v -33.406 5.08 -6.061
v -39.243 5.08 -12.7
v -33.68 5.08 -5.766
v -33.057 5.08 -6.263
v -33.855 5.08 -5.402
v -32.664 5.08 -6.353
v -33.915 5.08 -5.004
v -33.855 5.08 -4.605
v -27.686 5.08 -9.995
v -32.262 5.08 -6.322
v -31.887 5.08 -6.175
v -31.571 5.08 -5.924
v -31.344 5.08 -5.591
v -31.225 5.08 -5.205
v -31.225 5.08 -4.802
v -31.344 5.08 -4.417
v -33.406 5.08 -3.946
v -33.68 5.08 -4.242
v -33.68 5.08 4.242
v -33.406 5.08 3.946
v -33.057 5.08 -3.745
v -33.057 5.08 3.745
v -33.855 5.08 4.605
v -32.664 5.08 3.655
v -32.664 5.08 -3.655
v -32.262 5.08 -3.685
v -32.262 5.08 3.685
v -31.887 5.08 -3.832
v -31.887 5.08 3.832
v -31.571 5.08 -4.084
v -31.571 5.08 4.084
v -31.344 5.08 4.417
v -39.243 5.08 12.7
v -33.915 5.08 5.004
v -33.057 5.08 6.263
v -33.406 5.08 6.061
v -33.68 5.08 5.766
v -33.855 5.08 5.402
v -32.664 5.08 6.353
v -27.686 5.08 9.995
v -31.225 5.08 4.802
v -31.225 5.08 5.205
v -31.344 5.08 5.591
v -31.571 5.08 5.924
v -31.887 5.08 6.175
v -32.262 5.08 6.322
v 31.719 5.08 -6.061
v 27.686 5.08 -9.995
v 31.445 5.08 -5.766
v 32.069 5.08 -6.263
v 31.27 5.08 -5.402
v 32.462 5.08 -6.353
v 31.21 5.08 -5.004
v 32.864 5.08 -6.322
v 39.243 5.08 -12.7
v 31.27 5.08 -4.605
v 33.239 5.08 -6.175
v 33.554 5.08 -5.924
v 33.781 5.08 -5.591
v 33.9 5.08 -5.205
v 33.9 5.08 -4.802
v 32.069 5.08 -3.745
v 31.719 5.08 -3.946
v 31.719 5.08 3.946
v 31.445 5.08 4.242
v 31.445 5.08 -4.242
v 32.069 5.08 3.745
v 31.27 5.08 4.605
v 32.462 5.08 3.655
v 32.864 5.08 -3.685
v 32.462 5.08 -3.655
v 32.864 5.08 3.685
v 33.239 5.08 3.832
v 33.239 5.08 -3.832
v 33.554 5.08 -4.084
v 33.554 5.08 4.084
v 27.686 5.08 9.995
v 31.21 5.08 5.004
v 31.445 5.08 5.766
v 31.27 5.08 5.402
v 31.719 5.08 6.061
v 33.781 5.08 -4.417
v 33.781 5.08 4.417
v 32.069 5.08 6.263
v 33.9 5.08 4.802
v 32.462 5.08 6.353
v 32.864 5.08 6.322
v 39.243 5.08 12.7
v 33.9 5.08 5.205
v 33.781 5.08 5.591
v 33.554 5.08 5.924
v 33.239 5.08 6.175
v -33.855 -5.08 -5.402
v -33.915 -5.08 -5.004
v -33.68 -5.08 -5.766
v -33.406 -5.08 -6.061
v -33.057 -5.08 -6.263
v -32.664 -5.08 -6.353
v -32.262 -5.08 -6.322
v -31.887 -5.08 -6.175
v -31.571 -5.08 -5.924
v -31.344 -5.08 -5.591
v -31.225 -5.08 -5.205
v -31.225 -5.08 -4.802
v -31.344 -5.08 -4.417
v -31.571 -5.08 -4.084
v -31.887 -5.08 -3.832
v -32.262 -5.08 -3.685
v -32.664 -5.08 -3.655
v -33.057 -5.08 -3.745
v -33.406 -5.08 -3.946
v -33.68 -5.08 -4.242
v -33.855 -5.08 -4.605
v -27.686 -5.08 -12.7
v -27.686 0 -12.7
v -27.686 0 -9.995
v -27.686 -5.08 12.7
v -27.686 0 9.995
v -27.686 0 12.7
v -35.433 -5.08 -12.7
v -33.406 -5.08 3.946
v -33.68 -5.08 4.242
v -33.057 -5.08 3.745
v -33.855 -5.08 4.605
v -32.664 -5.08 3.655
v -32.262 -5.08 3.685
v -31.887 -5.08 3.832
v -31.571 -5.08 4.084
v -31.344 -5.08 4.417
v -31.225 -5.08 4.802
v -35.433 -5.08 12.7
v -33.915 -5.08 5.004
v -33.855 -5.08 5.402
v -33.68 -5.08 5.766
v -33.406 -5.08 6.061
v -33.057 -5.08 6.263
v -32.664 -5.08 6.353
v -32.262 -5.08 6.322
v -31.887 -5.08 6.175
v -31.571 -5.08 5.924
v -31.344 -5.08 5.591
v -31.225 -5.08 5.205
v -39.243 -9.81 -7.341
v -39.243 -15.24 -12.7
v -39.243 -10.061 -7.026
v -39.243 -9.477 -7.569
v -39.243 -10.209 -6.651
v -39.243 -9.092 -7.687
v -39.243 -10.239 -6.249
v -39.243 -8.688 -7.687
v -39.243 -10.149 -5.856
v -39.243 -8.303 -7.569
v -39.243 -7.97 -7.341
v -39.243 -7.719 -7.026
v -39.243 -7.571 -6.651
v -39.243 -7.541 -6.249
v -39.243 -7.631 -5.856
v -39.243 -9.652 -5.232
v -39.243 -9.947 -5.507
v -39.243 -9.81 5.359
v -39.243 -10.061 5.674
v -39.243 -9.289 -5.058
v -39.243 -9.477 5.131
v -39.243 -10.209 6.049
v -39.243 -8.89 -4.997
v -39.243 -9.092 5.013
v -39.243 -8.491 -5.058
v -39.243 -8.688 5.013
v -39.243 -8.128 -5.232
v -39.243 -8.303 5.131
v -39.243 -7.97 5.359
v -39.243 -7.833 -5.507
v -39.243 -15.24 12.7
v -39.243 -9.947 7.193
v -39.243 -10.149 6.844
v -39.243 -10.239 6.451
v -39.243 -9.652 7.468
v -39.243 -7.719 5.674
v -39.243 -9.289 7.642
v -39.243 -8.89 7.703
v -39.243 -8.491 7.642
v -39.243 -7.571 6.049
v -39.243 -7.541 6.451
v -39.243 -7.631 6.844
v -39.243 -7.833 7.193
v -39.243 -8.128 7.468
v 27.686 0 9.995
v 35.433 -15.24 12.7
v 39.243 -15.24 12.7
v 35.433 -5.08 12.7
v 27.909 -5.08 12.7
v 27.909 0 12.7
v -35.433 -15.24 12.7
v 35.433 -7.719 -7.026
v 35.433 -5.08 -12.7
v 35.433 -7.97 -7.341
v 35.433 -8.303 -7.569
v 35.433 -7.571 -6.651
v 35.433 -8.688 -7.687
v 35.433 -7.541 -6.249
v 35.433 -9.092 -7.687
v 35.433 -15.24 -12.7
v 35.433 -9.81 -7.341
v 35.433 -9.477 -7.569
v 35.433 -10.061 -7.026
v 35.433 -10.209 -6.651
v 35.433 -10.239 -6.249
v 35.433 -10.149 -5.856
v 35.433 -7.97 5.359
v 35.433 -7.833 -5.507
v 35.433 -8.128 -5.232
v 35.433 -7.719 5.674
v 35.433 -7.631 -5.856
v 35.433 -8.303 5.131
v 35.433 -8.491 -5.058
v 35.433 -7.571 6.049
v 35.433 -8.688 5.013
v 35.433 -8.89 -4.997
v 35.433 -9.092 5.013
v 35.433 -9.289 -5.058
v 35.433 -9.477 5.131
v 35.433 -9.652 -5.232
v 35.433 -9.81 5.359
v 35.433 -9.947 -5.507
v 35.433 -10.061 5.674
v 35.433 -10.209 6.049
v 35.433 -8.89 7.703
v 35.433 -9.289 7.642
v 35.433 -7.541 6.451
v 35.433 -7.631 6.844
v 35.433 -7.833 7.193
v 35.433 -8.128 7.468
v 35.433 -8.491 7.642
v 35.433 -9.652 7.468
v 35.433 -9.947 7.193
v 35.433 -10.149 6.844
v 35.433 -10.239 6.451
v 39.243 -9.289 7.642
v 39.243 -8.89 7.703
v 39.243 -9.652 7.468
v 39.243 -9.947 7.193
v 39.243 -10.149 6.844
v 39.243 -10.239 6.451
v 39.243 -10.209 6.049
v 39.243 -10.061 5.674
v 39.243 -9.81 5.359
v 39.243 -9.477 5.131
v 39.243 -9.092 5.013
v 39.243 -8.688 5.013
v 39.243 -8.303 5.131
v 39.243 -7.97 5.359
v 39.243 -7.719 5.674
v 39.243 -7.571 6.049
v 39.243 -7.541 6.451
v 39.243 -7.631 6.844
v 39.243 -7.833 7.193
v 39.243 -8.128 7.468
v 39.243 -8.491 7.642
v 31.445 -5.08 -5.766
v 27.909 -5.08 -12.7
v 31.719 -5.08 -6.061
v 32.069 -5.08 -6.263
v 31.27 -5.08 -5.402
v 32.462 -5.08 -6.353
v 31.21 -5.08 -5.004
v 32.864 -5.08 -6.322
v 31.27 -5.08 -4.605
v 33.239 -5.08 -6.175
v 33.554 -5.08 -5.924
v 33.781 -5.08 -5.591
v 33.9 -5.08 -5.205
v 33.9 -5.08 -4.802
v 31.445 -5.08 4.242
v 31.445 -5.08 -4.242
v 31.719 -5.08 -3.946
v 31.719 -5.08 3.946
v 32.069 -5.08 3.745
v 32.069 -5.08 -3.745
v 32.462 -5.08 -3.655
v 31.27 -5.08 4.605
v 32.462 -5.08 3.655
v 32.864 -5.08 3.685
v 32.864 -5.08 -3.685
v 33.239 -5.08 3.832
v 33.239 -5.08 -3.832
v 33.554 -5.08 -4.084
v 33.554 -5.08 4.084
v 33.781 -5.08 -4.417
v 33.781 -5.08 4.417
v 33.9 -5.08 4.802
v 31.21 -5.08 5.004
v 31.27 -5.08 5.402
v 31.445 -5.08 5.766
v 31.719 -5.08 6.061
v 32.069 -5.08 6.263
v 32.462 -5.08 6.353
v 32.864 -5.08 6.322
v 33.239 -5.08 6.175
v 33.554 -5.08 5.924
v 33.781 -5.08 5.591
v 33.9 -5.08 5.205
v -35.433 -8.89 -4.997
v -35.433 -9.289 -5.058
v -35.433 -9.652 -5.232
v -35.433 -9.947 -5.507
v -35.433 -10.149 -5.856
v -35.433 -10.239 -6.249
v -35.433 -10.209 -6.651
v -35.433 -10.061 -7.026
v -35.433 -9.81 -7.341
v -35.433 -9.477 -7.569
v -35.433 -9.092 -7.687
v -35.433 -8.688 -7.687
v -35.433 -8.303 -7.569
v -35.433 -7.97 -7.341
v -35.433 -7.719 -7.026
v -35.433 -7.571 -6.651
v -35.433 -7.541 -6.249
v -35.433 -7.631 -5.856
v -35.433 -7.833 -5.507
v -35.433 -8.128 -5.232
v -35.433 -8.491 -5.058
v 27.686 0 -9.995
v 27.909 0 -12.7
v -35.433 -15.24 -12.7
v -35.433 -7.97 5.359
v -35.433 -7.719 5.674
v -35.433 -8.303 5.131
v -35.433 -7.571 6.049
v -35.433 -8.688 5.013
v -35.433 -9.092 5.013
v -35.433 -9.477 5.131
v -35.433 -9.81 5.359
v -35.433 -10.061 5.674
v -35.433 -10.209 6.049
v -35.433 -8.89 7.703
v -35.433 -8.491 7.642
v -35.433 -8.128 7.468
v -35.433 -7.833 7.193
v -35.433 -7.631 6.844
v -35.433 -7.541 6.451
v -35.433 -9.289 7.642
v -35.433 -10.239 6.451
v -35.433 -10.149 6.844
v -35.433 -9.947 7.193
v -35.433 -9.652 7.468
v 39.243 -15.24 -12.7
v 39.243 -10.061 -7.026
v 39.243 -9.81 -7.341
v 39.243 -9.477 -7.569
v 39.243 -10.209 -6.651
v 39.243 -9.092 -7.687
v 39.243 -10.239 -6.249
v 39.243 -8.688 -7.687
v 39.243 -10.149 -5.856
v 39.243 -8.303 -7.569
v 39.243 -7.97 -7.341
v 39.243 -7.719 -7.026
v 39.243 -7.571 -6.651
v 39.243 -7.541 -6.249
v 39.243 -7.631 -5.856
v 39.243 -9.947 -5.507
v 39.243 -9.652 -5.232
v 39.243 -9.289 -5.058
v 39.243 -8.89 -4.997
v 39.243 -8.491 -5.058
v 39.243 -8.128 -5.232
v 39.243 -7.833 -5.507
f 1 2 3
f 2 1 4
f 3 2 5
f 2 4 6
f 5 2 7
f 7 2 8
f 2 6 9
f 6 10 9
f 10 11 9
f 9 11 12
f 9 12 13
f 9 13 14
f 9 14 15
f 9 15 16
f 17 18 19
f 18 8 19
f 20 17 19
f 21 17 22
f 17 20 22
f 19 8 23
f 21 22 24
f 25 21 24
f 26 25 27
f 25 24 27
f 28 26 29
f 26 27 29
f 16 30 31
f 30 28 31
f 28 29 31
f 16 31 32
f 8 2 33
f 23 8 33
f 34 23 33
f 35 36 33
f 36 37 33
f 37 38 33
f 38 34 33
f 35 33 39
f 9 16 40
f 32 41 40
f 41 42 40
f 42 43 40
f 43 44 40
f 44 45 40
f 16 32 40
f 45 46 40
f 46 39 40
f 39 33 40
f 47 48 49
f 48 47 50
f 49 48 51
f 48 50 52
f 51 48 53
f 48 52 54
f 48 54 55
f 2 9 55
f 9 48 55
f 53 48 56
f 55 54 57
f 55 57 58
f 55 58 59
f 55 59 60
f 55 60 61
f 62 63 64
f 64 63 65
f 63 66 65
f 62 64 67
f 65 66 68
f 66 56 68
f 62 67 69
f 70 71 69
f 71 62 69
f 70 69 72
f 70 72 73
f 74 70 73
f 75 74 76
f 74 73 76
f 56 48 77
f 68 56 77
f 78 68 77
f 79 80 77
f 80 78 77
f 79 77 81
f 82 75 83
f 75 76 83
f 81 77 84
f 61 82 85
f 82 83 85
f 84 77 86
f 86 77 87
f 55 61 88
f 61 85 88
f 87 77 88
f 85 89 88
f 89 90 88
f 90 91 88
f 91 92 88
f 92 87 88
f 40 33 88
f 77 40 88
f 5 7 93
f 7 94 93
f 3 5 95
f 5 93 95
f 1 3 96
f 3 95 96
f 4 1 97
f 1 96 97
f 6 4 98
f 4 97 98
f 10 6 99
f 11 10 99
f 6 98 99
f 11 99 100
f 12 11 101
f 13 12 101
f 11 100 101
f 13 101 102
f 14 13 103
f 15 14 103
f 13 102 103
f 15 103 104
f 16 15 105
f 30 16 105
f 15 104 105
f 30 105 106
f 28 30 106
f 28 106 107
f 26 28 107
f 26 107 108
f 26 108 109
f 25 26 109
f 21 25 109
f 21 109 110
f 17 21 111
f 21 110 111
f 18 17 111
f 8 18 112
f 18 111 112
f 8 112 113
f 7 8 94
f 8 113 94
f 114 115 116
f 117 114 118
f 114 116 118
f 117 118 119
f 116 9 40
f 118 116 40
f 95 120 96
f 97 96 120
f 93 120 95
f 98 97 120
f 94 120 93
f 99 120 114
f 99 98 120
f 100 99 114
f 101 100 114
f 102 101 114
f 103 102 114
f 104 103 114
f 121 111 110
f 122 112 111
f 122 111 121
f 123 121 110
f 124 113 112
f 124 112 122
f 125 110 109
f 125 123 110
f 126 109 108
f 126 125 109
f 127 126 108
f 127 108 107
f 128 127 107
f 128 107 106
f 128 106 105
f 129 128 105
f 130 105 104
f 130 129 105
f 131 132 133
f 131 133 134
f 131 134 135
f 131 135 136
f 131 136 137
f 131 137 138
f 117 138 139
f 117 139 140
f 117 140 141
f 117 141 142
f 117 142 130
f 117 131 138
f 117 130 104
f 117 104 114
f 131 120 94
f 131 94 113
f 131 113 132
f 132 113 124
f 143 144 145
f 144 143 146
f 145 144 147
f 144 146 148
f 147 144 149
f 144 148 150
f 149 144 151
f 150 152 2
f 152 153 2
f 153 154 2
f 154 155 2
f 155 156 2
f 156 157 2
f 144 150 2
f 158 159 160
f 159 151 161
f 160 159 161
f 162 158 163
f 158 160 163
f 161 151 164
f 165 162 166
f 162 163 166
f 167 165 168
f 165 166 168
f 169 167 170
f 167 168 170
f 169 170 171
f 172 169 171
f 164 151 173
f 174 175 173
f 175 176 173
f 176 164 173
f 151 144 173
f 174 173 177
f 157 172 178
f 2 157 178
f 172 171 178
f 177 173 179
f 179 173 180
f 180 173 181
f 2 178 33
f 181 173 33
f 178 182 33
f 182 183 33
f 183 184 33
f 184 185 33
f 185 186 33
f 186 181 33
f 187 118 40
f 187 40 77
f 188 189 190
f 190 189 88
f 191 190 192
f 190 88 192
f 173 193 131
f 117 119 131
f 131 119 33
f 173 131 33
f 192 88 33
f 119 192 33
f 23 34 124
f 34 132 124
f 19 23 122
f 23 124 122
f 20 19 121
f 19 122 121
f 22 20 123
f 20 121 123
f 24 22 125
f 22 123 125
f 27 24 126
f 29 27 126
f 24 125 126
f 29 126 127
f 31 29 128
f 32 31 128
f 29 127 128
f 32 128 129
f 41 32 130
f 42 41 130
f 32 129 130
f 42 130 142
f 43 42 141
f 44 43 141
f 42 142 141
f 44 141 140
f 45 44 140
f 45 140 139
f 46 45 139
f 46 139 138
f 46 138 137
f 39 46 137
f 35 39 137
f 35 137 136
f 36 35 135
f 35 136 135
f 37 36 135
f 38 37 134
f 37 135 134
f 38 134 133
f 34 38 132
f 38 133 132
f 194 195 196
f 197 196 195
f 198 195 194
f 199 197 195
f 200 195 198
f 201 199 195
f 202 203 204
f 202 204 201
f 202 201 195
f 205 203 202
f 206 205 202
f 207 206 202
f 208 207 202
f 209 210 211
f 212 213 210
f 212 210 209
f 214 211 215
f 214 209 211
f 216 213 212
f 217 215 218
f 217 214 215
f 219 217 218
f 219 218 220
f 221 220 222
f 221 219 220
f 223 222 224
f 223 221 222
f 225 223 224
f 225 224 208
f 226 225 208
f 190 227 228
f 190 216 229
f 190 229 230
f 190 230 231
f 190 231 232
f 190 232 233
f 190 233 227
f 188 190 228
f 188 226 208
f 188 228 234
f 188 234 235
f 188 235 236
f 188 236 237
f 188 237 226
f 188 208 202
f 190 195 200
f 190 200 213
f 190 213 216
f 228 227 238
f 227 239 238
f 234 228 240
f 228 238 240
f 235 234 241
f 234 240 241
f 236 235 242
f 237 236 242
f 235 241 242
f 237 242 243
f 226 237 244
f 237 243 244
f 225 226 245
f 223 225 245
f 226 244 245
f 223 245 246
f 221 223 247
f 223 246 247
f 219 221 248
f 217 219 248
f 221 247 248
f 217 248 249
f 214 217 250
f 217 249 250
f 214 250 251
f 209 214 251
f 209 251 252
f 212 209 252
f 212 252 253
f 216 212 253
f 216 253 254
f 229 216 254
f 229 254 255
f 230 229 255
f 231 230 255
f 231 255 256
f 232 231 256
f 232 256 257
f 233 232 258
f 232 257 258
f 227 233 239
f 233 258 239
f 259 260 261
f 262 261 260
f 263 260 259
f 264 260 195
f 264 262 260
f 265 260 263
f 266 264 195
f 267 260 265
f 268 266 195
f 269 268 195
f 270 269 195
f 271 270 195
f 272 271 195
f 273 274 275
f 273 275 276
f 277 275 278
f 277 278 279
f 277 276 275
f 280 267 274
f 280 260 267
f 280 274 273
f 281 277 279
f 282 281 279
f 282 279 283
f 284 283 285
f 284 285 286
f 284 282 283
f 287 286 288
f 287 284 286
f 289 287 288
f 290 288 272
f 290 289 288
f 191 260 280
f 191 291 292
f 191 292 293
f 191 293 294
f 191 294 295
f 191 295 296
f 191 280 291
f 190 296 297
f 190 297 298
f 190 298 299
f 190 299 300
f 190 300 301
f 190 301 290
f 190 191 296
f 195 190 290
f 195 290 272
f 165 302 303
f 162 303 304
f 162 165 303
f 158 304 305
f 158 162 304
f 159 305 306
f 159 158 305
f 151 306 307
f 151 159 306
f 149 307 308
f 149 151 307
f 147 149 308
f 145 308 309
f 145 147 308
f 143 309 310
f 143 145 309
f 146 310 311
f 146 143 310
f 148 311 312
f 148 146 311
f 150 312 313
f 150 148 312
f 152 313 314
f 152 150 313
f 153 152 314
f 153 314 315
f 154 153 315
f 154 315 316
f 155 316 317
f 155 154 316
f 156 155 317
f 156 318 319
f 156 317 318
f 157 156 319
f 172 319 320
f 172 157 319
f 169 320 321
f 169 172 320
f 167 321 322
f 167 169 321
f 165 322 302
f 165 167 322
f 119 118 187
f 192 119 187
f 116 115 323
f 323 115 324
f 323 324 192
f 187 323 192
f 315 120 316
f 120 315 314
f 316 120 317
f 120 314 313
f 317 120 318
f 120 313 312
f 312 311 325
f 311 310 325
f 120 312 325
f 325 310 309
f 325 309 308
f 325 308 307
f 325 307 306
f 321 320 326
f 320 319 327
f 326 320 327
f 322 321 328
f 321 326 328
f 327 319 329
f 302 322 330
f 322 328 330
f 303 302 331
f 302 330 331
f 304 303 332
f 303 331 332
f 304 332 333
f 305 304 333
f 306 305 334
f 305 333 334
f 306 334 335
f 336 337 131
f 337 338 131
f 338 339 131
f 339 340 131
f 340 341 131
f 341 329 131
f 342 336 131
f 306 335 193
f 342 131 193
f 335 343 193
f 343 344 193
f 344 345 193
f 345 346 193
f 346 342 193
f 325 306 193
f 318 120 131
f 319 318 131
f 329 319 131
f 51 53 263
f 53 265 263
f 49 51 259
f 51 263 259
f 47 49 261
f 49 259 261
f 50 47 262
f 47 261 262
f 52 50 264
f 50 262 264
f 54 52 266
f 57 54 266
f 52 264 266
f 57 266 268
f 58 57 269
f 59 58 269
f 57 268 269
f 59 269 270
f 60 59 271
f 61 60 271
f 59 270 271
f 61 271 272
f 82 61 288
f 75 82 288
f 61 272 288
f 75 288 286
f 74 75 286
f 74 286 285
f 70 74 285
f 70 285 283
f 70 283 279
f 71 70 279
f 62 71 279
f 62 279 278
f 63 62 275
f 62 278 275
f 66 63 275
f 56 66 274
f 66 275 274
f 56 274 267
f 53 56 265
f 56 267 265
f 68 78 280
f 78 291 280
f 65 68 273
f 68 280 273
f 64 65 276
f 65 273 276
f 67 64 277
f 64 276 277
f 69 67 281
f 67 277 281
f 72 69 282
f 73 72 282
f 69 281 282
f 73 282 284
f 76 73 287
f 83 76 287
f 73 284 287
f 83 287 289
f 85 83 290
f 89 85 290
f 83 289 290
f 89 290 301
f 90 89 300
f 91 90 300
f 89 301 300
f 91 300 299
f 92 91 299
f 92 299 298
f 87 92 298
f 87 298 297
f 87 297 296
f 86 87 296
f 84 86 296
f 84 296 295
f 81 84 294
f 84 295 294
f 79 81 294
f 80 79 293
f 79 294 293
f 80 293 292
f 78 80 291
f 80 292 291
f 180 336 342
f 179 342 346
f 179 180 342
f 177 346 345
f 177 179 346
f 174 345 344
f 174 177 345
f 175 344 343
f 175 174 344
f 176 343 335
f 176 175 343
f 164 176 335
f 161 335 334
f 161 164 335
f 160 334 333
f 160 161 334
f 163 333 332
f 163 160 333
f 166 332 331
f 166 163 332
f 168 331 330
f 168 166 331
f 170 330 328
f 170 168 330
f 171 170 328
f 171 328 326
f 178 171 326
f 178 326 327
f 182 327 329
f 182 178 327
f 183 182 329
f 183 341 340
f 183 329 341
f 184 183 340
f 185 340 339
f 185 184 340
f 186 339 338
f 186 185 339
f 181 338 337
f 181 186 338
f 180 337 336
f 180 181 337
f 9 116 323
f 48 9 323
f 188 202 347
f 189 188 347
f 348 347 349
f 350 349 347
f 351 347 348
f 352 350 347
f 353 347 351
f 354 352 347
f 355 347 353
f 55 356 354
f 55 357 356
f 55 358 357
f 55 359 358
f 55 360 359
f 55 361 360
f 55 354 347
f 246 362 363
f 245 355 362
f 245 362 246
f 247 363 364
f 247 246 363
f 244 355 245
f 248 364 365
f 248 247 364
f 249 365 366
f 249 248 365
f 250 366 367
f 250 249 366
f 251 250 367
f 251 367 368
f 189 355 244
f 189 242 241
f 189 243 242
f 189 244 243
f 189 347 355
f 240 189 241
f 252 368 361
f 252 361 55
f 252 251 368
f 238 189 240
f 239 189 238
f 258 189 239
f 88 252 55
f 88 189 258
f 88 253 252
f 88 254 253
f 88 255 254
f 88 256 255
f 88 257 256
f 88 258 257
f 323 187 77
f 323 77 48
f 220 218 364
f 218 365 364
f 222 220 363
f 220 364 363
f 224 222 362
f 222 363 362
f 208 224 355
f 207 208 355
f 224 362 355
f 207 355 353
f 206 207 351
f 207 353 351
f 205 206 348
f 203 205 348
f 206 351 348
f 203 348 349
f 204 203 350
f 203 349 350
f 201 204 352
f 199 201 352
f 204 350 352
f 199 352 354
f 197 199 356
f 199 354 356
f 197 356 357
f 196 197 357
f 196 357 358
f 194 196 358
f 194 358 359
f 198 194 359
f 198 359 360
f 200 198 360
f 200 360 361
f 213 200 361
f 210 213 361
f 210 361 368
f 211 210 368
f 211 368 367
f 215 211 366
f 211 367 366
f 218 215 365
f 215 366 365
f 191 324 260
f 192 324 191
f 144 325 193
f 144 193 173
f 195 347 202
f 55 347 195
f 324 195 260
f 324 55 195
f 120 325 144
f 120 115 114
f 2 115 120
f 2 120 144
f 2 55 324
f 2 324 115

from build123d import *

# Parameters (mm, degrees)
SKETCH1_W                          = 70.866
SKETCH1_H                          = 25.4
SKETCH1_W_2                        = 55.372
SKETCH1_H_2                        = 19.9898
BOSS_EXTRUDE1_DEPTH                = 5.08
SKETCH7_W                          = 7.747
SKETCH7_H                          = 25.4
SKETCH7_W_2                        = 7.523824479
BOSS_EXTRUDE2_DEPTH                = 5.08
BOSS_EXTRUDE3_DEPTH                = 25.4
TAP_DRILL_FOR_6_32_TAP1_D          = 2.7051
TAP_DRILL_FOR_6_32_TAP1_DEPTH      = 10.16
TAP_DRILL_FOR_6_32_TAP1_TIP        = 0.81269403
TAP_DRILL_FOR_6_32_TAP2_AT_2_COUNT = 2
TAP_DRILL_FOR_6_32_TAP2_AT_2_PITCH = 12.7


with BuildPart() as part:
    # Sketch1 → Boss-Extrude1 (new body)
    with BuildSketch(Plane(origin=(0, 0, 0), x_dir=(1, 0, 0), z_dir=(0, 1, 0))):
        Rectangle(SKETCH1_W, SKETCH1_H)
        Rectangle(SKETCH1_W_2, SKETCH1_H_2, mode=Mode.SUBTRACT)
    extrude(amount=BOSS_EXTRUDE1_DEPTH)

    # Sketch7 → Boss-Extrude2 (add)
    with BuildSketch(Plane.XZ):
        with Locations((-31.5595, 0)):
            Rectangle(SKETCH7_W, SKETCH7_H)
        with Locations((31.671087761, 0)):
            Rectangle(SKETCH7_W_2, SKETCH7_H)
    extrude(amount=BOSS_EXTRUDE2_DEPTH)

    # Sketch8 → Boss-Extrude3 (add)
    with BuildSketch(Plane.XY.offset(12.7)):
        Polygon((35.433, 5.08), (35.433, -15.24), (39.243, -15.24), (39.243, -5.08), (39.243, 5.08), align=None)
    boss_extrude3 = extrude(amount=-BOSS_EXTRUDE3_DEPTH)

    # Mirror1: Boss-Extrude3 across plane
    add(boss_extrude3.mirror(Plane(origin=(0, 0, 0), x_dir=(0, 0, 1), z_dir=(1, 0, 0))))

    # Tap Drill for #6-32 Tap1
    with Locations(Plane(origin=(0, 5.08, 0), x_dir=(1, 0, 0), z_dir=(0, 1, 0))):
        with Locations((-32.5628, 5.0038), (-32.5628, -5.0038), (32.5628, 5.0038), (32.5628, -5.0038)):
            Hole(TAP_DRILL_FOR_6_32_TAP1_D / 2, depth=TAP_DRILL_FOR_6_32_TAP1_DEPTH)
            with Locations((0, 0, -(TAP_DRILL_FOR_6_32_TAP1_DEPTH + TAP_DRILL_FOR_6_32_TAP1_TIP / 2))):  # 118° drill point
                Cone(0, TAP_DRILL_FOR_6_32_TAP1_D / 2, TAP_DRILL_FOR_6_32_TAP1_TIP, mode=Mode.SUBTRACT)

    # Sketch10 → Tap Drill for #6-32 Tap2 (revolve, cut)
    with BuildSketch(Plane(origin=(-39.243, -8.89, -6.35), x_dir=(0, 0, 1), z_dir=(0, 1, 0))):
        Polygon((0, 0), (0, 10.97269403), (1.35255, 10.16), (1.35255, 0), align=None)
    tap_drill_for_6_32_tap2 = revolve(axis=Axis((-45.593, -8.89, -6.35), (1, 0, 0)), mode=Mode.SUBTRACT)

    # Tap Drill for #6-32 Tap2 at 2: Tap Drill for #6-32 Tap2 ×2
    with Locations(*[(0, 0, i * TAP_DRILL_FOR_6_32_TAP2_AT_2_PITCH) for i in range(1, TAP_DRILL_FOR_6_32_TAP2_AT_2_COUNT)]):
        add(tap_drill_for_6_32_tap2, mode=Mode.SUBTRACT)

    # Mirror2: Tap Drill for #6-32 Tap2 across plane
    add(tap_drill_for_6_32_tap2.mirror(Plane(origin=(0, 0, 0), x_dir=(0, 0, 1), z_dir=(1, 0, 0))), mode=Mode.SUBTRACT)

    # Mirror2 copy 1 sketch → Mirror2 copy 1 (revolve, cut)
    with BuildSketch(Plane(origin=(39.243, -8.89, 6.35), x_dir=(0, 0, 1), z_dir=(0, 1, 0))):
        Polygon((0, 0), (0, -10.97269403), (1.35255, -10.16), (1.35255, 0), align=None)
    revolve(axis=Axis((45.593, -8.89, 6.35), (1, 0, 0)), mode=Mode.SUBTRACT)


solid = part.part
